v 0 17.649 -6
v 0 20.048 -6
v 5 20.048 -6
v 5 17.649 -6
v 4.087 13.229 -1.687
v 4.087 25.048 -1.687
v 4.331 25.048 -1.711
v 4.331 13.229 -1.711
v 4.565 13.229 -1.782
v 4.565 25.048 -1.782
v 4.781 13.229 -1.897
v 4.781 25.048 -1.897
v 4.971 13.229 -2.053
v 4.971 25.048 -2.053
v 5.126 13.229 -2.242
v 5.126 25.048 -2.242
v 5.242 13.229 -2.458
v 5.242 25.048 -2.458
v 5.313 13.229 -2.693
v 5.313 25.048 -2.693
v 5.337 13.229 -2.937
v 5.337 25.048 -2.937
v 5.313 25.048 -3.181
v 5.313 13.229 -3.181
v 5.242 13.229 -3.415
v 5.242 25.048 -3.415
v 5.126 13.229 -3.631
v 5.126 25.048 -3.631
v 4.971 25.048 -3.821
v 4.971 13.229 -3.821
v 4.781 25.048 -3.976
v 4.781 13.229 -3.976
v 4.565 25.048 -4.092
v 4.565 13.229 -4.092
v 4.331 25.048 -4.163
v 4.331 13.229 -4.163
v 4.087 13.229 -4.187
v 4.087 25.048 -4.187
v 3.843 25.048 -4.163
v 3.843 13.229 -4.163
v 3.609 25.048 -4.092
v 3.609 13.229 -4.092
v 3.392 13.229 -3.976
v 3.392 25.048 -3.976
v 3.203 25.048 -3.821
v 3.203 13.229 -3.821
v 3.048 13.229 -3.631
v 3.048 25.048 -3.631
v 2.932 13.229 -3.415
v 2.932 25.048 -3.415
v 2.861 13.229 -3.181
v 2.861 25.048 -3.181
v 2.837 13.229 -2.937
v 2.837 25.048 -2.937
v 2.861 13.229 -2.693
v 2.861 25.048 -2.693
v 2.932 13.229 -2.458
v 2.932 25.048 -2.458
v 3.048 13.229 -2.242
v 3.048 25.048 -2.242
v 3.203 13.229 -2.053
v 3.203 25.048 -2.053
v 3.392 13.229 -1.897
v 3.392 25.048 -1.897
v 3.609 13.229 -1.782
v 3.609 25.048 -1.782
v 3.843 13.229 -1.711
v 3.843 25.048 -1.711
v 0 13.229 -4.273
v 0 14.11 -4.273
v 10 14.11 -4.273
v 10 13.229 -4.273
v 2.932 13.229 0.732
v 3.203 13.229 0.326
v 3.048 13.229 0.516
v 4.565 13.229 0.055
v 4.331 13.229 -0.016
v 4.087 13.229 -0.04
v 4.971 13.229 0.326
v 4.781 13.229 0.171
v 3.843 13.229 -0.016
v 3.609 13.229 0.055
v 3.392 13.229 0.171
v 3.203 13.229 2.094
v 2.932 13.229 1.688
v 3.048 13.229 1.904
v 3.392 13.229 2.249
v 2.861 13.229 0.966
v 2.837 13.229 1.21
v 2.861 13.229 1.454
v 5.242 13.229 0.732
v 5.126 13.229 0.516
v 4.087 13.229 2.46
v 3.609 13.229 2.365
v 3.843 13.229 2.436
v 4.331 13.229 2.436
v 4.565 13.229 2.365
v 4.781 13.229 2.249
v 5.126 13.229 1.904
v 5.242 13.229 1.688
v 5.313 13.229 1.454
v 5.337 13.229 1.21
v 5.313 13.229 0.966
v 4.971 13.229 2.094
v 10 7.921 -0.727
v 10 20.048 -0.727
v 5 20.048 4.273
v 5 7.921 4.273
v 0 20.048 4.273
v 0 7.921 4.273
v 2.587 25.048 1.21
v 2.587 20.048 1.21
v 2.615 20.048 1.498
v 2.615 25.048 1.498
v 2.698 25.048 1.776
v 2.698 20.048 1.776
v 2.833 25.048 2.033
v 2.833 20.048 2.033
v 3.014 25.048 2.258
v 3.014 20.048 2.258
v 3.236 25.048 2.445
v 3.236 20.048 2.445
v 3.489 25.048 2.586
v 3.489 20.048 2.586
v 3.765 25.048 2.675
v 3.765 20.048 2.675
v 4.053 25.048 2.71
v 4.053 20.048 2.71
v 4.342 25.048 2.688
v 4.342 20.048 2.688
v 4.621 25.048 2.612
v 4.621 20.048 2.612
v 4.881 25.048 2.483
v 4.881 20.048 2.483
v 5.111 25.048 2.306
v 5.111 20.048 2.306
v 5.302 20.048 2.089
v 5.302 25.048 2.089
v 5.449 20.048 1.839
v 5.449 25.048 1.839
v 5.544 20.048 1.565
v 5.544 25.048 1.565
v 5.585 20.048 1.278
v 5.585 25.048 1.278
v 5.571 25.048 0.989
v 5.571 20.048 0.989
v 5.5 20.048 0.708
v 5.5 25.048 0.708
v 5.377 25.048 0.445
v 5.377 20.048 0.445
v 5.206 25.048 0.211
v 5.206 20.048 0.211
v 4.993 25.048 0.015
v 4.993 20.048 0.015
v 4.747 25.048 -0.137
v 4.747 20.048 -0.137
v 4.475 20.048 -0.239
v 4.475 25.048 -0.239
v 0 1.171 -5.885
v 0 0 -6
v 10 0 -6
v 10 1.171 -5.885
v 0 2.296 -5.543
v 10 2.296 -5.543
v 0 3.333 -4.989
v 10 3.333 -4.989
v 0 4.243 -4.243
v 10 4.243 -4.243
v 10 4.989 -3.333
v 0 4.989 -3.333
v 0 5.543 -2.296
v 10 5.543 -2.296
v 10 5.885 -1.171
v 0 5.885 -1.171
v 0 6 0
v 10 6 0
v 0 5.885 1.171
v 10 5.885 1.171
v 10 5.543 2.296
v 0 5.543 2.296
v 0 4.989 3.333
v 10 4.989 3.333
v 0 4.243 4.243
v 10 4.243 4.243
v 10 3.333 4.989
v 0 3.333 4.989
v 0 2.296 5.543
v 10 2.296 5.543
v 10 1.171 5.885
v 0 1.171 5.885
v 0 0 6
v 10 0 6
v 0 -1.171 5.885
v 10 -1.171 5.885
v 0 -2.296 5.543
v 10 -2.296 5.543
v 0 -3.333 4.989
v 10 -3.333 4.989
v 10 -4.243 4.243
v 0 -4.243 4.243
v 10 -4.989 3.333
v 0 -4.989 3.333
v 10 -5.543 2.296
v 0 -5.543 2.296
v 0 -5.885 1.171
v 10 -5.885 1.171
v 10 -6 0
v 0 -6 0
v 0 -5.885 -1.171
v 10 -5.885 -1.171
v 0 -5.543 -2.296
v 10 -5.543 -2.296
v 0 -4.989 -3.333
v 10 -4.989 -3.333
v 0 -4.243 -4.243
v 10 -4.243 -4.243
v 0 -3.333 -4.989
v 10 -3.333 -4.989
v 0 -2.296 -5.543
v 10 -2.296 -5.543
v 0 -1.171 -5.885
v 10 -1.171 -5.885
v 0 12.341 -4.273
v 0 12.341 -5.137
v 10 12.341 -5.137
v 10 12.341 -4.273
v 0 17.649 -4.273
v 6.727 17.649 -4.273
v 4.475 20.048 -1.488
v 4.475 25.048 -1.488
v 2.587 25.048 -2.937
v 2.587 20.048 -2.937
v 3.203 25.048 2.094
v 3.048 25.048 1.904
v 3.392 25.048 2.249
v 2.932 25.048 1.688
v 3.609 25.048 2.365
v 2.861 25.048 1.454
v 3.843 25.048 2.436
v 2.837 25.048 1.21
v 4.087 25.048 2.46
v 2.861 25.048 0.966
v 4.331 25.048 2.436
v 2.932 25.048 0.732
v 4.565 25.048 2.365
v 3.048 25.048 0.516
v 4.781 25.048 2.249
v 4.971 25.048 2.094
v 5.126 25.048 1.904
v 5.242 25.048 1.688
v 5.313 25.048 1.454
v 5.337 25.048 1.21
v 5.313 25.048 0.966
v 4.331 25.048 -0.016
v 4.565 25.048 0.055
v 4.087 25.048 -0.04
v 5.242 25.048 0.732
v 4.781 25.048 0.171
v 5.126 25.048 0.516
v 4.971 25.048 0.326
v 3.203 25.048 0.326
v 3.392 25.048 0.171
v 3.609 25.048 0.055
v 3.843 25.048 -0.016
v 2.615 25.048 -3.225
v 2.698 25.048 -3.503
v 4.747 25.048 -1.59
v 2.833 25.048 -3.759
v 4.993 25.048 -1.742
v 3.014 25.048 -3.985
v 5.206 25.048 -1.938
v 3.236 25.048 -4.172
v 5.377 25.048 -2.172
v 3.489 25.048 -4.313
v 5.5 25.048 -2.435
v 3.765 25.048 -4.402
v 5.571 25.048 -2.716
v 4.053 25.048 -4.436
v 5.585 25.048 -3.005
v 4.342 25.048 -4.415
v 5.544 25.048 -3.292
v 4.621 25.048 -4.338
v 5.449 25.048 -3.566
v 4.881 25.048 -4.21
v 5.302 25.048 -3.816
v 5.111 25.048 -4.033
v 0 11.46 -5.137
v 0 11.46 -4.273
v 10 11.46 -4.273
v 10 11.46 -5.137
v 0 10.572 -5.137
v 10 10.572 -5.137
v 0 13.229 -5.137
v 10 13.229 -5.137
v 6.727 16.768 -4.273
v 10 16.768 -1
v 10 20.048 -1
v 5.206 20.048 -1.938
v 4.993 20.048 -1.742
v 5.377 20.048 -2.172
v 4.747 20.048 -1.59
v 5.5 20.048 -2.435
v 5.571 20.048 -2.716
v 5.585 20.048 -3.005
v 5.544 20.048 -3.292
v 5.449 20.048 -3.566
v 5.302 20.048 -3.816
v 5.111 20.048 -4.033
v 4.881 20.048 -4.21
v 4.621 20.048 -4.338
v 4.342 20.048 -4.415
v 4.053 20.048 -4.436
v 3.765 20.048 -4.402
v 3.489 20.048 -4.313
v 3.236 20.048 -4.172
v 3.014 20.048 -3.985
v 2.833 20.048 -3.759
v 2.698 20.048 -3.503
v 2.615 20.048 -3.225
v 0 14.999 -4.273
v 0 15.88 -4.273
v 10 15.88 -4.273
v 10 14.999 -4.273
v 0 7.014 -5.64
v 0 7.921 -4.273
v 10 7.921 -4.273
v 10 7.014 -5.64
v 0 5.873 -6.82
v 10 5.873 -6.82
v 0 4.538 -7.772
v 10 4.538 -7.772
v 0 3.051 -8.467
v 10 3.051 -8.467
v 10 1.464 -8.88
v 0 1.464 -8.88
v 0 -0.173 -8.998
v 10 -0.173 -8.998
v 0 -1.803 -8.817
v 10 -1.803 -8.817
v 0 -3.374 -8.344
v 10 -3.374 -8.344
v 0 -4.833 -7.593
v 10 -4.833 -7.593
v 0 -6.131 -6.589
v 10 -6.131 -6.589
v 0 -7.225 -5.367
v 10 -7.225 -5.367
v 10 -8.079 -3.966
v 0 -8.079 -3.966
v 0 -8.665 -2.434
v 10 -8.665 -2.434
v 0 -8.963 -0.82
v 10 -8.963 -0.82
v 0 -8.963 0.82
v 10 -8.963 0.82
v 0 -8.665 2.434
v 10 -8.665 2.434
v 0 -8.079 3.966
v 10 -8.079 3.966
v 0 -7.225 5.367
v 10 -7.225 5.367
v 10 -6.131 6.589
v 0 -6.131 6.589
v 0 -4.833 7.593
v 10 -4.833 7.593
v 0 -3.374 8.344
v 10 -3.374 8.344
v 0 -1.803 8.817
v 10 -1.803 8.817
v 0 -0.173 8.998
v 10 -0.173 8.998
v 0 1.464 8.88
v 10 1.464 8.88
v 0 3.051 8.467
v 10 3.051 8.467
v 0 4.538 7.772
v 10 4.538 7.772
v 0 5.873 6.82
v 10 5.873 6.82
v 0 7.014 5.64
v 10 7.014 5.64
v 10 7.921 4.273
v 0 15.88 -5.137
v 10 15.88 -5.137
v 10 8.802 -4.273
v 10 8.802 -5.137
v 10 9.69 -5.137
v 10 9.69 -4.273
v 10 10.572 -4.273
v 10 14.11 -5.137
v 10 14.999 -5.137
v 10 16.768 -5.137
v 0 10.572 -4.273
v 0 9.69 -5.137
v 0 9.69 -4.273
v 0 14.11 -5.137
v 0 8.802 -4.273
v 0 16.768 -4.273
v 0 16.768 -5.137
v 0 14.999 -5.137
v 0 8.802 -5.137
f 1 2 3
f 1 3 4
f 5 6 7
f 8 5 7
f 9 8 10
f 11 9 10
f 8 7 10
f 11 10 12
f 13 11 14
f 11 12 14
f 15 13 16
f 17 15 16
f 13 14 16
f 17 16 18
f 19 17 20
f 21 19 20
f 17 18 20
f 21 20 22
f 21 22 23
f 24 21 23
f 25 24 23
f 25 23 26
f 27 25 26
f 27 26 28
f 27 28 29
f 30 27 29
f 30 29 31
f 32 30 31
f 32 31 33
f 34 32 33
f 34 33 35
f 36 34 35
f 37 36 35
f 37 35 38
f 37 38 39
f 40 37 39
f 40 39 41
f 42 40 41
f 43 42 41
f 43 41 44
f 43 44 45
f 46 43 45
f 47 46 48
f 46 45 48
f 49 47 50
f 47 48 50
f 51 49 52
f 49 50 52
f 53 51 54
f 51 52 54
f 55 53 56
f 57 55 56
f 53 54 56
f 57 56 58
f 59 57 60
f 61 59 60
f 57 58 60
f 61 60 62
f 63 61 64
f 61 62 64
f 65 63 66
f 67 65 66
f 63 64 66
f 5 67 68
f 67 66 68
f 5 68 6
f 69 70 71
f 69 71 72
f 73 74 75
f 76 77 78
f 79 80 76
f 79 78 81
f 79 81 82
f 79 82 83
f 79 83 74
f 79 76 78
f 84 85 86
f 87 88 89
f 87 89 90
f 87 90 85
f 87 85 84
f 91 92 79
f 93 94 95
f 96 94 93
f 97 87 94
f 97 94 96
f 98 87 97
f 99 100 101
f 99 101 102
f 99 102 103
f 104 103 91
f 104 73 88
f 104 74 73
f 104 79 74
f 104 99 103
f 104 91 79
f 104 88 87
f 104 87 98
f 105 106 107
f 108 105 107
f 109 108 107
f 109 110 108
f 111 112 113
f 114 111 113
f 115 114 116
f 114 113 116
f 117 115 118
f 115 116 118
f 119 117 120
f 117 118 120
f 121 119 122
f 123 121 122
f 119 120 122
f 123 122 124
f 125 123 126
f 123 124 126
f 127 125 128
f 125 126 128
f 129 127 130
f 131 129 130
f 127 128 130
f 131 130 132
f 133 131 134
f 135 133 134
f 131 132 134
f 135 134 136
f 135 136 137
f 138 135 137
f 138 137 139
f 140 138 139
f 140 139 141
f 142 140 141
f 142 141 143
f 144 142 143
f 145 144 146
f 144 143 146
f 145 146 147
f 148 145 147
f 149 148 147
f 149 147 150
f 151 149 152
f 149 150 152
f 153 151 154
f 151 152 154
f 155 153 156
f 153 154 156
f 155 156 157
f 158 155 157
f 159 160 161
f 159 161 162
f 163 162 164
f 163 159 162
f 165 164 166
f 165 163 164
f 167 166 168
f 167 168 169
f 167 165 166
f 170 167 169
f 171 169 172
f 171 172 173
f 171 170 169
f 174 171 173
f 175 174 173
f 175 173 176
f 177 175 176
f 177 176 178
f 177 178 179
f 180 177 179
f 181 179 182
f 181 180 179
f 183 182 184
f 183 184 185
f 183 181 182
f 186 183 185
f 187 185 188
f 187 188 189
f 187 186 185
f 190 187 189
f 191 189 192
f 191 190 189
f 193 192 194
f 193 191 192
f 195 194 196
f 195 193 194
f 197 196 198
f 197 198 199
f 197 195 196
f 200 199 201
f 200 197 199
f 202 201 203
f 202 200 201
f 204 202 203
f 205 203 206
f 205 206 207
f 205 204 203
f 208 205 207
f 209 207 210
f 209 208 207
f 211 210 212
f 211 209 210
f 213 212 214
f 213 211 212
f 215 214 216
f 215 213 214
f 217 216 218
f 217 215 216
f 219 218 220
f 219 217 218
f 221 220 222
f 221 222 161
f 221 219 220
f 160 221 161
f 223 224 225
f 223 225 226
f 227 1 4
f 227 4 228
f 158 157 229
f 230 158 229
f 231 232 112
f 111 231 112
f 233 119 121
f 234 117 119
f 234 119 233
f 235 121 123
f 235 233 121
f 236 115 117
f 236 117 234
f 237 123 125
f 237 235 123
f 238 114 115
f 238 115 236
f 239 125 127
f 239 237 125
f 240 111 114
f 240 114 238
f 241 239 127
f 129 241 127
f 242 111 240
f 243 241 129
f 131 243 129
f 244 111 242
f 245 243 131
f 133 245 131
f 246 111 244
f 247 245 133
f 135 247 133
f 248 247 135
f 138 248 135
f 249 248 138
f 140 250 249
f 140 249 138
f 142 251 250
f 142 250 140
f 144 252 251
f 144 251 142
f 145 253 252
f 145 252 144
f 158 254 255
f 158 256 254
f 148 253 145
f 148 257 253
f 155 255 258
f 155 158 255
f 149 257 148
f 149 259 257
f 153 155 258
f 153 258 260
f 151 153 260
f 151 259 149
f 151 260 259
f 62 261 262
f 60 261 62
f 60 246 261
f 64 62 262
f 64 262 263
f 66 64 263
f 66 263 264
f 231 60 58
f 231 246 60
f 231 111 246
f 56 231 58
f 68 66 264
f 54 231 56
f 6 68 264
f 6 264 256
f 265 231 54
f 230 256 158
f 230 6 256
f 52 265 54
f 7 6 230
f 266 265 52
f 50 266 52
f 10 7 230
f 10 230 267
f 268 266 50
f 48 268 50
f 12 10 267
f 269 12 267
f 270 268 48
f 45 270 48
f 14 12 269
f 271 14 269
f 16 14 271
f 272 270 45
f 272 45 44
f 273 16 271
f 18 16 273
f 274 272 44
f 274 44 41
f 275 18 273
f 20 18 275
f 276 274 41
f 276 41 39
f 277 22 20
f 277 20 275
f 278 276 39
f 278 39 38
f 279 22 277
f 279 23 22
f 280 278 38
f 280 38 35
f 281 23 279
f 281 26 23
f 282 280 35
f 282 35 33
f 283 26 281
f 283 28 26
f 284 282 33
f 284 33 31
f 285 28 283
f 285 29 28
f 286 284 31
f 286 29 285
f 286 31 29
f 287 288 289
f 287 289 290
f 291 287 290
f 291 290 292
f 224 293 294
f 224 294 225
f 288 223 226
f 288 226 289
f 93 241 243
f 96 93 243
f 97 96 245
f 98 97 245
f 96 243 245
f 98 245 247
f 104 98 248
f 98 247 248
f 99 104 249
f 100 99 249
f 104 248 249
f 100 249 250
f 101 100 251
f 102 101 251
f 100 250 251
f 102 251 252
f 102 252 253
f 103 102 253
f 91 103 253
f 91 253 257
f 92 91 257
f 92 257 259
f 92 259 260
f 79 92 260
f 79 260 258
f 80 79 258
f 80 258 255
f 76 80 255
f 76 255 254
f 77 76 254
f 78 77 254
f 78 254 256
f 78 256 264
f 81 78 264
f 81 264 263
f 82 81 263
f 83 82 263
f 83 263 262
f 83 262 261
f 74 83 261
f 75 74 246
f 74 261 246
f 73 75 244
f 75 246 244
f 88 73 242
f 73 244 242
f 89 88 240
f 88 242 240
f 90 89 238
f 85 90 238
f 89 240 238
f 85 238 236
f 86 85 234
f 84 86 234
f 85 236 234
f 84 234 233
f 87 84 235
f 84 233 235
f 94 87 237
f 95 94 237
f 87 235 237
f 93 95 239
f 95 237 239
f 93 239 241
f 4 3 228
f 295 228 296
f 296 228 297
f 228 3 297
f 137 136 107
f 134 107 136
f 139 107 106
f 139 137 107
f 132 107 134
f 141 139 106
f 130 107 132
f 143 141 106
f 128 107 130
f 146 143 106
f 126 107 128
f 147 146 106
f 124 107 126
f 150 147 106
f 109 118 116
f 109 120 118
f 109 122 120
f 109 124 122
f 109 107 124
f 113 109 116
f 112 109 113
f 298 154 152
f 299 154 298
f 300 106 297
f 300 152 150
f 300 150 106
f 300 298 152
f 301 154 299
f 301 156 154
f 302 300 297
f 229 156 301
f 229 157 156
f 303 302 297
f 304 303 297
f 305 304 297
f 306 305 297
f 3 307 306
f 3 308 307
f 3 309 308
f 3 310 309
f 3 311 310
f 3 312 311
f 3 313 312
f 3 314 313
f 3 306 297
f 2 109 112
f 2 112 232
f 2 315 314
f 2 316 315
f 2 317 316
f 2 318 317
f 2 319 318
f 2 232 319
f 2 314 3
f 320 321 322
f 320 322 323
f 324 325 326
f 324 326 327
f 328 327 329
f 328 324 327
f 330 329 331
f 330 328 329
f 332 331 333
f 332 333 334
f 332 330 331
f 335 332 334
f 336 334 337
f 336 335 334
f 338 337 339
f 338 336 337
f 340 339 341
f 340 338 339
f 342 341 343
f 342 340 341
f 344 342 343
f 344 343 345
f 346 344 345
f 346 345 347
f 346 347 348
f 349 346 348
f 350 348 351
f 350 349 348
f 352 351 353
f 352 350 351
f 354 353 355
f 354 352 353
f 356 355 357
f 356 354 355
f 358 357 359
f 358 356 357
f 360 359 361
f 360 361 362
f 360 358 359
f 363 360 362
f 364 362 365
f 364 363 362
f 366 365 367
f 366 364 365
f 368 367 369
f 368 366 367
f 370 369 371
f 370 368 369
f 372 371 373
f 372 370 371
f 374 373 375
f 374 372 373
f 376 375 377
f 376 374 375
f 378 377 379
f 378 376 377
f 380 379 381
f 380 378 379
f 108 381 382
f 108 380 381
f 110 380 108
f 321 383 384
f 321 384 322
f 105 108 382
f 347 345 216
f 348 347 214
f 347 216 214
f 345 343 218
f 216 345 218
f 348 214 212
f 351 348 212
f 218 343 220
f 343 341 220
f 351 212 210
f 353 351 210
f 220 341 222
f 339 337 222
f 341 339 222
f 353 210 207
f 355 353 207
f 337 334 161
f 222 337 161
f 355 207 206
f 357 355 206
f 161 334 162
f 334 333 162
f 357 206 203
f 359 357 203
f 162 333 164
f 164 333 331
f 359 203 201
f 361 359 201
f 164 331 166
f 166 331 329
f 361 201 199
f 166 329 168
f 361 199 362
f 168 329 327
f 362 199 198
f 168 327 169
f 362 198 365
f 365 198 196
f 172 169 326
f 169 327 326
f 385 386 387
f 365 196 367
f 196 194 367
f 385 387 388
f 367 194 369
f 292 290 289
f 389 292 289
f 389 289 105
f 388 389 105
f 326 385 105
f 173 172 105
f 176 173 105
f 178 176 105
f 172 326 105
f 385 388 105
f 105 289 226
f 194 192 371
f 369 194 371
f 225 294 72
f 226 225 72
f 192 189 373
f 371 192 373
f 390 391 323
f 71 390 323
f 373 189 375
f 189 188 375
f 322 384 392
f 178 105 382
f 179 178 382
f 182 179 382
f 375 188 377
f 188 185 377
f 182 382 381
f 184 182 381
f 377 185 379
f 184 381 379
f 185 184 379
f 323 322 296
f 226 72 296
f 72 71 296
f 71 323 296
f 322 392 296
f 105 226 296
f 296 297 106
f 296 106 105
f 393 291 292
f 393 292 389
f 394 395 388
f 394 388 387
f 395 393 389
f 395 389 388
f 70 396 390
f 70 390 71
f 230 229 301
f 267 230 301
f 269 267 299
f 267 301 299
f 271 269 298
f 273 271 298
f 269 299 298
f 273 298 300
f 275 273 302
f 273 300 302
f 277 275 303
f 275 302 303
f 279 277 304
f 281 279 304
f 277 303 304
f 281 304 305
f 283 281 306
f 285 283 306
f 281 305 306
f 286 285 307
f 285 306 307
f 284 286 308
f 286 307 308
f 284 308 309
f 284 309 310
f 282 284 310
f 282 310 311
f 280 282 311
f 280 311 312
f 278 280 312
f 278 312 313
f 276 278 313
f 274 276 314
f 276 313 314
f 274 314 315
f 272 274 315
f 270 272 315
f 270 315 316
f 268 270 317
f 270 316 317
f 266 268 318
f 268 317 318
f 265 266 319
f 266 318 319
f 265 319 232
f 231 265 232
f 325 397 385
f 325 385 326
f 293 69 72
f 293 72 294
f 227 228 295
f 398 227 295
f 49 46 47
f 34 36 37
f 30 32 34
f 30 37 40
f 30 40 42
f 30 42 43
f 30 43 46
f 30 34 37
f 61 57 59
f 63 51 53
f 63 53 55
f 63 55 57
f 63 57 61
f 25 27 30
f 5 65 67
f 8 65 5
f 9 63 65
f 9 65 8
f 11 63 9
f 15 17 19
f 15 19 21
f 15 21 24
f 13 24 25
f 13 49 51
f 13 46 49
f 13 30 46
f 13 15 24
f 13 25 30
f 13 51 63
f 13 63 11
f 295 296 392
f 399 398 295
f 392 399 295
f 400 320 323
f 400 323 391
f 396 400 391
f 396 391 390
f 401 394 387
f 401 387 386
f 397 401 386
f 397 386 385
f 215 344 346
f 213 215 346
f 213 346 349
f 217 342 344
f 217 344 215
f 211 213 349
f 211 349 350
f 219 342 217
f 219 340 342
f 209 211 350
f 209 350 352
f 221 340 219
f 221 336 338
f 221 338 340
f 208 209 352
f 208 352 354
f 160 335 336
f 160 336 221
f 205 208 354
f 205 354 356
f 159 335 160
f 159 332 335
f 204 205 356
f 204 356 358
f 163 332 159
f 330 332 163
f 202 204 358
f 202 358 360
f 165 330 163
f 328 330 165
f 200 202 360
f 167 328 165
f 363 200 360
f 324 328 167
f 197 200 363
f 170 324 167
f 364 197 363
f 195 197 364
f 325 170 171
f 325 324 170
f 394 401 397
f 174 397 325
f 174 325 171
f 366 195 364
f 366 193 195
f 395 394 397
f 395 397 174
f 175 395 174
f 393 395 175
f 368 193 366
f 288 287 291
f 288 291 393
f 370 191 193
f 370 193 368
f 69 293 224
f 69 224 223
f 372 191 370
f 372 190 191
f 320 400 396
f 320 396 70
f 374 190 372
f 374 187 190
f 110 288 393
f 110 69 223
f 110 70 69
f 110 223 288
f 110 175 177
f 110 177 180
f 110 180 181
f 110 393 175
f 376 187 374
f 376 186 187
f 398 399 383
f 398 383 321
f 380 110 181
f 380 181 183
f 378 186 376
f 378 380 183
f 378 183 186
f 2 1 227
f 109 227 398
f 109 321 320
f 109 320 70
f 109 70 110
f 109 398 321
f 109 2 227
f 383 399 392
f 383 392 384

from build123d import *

# Parameters (mm, degrees)
SKETCH1_R           = 6
BOSS_EXTRUDE1_DEPTH = 10
CUT_EXTRUDE1_REACH  = 34.013
CUT_EXTRUDE2_START  = -12.127591
CUT_EXTRUDE2_DEPTH  = 8.847142
BOSS_EXTRUDE7_DEPTH = 5
SKETCH3_R           = 1.25
CUT_EXTRUDE3_DEPTH  = 5
SKETCH3_2_R         = 1.25
CUT_EXTRUDE4_DEPTH  = 11.819305932


with BuildPart() as part:
    # Sketch1 → Boss-Extrude1 (new body)
    with BuildSketch(Plane(origin=(0, 0, 0), x_dir=(0, 0, -1), z_dir=(1, 0, 0))):
        with BuildLine():
            Line((-4.273163423, 7.920863233), (-4.273163423, 20.04845395))
            Line((-4.273163423, 20.04845395), (6, 20.04845395))
            Line((6, 20.04845395), (6, 17.649323049))
            Line((6, 17.649323049), (4.273163423, 17.649323049))
            Line((4.273163423, 17.649323049), (4.273163423, 16.76800454))
            Line((4.273163423, 16.76800454), (5.136581711, 16.76800454))
            Line((5.136581711, 16.76800454), (5.136581711, 15.879894787))
            Line((5.136581711, 15.879894787), (4.273163423, 15.879894787))
            Line((4.273163423, 15.879894787), (4.273163423, 14.998576279))
            Line((4.273163423, 14.998576279), (5.136581711, 14.998576279))
            Line((5.136581711, 14.998576279), (5.136581711, 14.110466526))
            Line((5.136581711, 14.110466526), (4.273163423, 14.110466526))
            Line((4.273163423, 14.110466526), (4.273163423, 13.229148017))
            Line((4.273163423, 13.229148017), (5.136581711, 13.229148017))
            Line((5.136581711, 13.229148017), (5.136581711, 12.341038265))
            Line((5.136581711, 12.341038265), (4.273163423, 12.341038265))
            Line((4.273163423, 12.341038265), (4.273163423, 11.459719756))
            Line((4.273163423, 11.459719756), (5.136581711, 11.459719756))
            Line((5.136581711, 11.459719756), (5.136581711, 10.571610003))
            Line((5.136581711, 10.571610003), (4.273163423, 10.571610003))
            Line((4.273163423, 10.571610003), (4.273163423, 9.690291495))
            Line((4.273163423, 9.690291495), (5.136581711, 9.690291495))
            Line((5.136581711, 9.690291495), (5.136581711, 8.802181742))
            Line((5.136581711, 8.802181742), (4.273163423, 8.802181742))
            Line((4.273163423, 8.802181742), (4.273163423, 7.920863233))
            ThreePointArc((4.273163423, 7.920863233), (0, -9), (-4.273163423, 7.920863233))
        make_face()
        Circle(SKETCH1_R, mode=Mode.SUBTRACT)
    extrude(amount=BOSS_EXTRUDE1_DEPTH)

    # Cut-Extrude1: up to this face of the body (flat: up to its plane)
    cut_extrude1_end = Plane(part.part.faces().sort_by_distance((5, 16.76800454, -4.704872567))[0])
    # Sketch2 → Cut-Extrude1 (cut, up to the picked face)
    with BuildSketch(Plane(origin=(0, 20.04845395, 0), x_dir=(1, 0, 0), z_dir=(0, 1, 0)), mode=Mode.PRIVATE) as cut_extrude1_sk1:
        Polygon((10, 6), (5, 6), (10, 1), align=None)
    cut_extrude1_tool1 = split(extrude(cut_extrude1_sk1.sketch, amount=-CUT_EXTRUDE1_REACH, mode=Mode.PRIVATE), bisect_by=cut_extrude1_end, keep=Keep.BOTH, mode=Mode.PRIVATE)
    # Sketch2 → Cut-Extrude1 (cut, up to the picked face)
    with BuildSketch(Plane(origin=(0, 20.04845395, 0), x_dir=(1, 0, 0), z_dir=(0, 1, 0)), mode=Mode.PRIVATE) as cut_extrude1_sk2:
        Polygon((10, -4.273163423), (10, 0.726836577), (5, -4.273163423), align=None)
    cut_extrude1_tool2 = split(extrude(cut_extrude1_sk2.sketch, amount=-CUT_EXTRUDE1_REACH, mode=Mode.PRIVATE), bisect_by=cut_extrude1_end, keep=Keep.BOTH, mode=Mode.PRIVATE)
    add(cut_extrude1_tool1.solids().sort_by(Axis((8.333333, 20.048454, -4.333333), (0, -1, 0)))[0], mode=Mode.SUBTRACT)
    add(cut_extrude1_tool2.solids().sort_by(Axis((8.333333, 20.048454, 2.606497), (0, -1, 0)))[0], mode=Mode.SUBTRACT)

    # Sketch2<5> → Cut-Extrude2 (cut)
    with BuildSketch(Plane(origin=(0, 20.04845395, 0), x_dir=(1, 0, 0), z_dir=(0, 1, 0)).offset(CUT_EXTRUDE2_START)):
        Polygon((10, -4.273163423), (10, 0.726836577), (5, -4.273163423), align=None)
    extrude(amount=CUT_EXTRUDE2_DEPTH, mode=Mode.SUBTRACT)

    # Sketch2<6> → Boss-Extrude7 (add)
    with BuildSketch(Plane(origin=(0, 20.04845395, 0), x_dir=(1, 0, 0), z_dir=(0, 1, 0))):
        with BuildLine():
            Line((2.586901632, 2.936824491), (2.586901632, -1.209987914))
            ThreePointArc((2.586901632, -1.209987914), (5, -2.400051514), (4.475236793, 0.238872259))
            Line((4.475236793, 0.238872259), (4.475236793, 1.487964318))
            ThreePointArc((4.475236793, 1.487964318), (5, 4.126888091), (2.586901632, 2.936824491))
        make_face()
    extrude(amount=BOSS_EXTRUDE7_DEPTH)

    # Sketch3 → Cut-Extrude3 (cut)
    with BuildSketch(Plane(origin=(0, 25.04845395, 0), x_dir=(1, 0, 0), z_dir=(0, 1, 0))):
        with Locations(Location((4.086901632, 2.936824491, 0), (0, 0, 270))):
            Circle(SKETCH3_R)
        with Locations(Location((4.086901632, -1.209987914, 0), (0, 0, 270))):
            Circle(SKETCH3_R)
    extrude(amount=-CUT_EXTRUDE3_DEPTH, mode=Mode.SUBTRACT)

    # Sketch3<2> → Cut-Extrude4 (cut)
    with BuildSketch(Plane(origin=(0, 25.04845395, 0), x_dir=(1, 0, 0), z_dir=(0, 1, 0))):
        with Locations(Location((4.086901632, 2.936824491, 0), (0, 0, 270))):
            Circle(SKETCH3_2_R)
        with Locations(Location((4.086901632, -1.209987914, 0), (0, 0, 270))):
            Circle(SKETCH3_2_R)
    extrude(amount=-CUT_EXTRUDE4_DEPTH, mode=Mode.SUBTRACT)


solid = part.part
